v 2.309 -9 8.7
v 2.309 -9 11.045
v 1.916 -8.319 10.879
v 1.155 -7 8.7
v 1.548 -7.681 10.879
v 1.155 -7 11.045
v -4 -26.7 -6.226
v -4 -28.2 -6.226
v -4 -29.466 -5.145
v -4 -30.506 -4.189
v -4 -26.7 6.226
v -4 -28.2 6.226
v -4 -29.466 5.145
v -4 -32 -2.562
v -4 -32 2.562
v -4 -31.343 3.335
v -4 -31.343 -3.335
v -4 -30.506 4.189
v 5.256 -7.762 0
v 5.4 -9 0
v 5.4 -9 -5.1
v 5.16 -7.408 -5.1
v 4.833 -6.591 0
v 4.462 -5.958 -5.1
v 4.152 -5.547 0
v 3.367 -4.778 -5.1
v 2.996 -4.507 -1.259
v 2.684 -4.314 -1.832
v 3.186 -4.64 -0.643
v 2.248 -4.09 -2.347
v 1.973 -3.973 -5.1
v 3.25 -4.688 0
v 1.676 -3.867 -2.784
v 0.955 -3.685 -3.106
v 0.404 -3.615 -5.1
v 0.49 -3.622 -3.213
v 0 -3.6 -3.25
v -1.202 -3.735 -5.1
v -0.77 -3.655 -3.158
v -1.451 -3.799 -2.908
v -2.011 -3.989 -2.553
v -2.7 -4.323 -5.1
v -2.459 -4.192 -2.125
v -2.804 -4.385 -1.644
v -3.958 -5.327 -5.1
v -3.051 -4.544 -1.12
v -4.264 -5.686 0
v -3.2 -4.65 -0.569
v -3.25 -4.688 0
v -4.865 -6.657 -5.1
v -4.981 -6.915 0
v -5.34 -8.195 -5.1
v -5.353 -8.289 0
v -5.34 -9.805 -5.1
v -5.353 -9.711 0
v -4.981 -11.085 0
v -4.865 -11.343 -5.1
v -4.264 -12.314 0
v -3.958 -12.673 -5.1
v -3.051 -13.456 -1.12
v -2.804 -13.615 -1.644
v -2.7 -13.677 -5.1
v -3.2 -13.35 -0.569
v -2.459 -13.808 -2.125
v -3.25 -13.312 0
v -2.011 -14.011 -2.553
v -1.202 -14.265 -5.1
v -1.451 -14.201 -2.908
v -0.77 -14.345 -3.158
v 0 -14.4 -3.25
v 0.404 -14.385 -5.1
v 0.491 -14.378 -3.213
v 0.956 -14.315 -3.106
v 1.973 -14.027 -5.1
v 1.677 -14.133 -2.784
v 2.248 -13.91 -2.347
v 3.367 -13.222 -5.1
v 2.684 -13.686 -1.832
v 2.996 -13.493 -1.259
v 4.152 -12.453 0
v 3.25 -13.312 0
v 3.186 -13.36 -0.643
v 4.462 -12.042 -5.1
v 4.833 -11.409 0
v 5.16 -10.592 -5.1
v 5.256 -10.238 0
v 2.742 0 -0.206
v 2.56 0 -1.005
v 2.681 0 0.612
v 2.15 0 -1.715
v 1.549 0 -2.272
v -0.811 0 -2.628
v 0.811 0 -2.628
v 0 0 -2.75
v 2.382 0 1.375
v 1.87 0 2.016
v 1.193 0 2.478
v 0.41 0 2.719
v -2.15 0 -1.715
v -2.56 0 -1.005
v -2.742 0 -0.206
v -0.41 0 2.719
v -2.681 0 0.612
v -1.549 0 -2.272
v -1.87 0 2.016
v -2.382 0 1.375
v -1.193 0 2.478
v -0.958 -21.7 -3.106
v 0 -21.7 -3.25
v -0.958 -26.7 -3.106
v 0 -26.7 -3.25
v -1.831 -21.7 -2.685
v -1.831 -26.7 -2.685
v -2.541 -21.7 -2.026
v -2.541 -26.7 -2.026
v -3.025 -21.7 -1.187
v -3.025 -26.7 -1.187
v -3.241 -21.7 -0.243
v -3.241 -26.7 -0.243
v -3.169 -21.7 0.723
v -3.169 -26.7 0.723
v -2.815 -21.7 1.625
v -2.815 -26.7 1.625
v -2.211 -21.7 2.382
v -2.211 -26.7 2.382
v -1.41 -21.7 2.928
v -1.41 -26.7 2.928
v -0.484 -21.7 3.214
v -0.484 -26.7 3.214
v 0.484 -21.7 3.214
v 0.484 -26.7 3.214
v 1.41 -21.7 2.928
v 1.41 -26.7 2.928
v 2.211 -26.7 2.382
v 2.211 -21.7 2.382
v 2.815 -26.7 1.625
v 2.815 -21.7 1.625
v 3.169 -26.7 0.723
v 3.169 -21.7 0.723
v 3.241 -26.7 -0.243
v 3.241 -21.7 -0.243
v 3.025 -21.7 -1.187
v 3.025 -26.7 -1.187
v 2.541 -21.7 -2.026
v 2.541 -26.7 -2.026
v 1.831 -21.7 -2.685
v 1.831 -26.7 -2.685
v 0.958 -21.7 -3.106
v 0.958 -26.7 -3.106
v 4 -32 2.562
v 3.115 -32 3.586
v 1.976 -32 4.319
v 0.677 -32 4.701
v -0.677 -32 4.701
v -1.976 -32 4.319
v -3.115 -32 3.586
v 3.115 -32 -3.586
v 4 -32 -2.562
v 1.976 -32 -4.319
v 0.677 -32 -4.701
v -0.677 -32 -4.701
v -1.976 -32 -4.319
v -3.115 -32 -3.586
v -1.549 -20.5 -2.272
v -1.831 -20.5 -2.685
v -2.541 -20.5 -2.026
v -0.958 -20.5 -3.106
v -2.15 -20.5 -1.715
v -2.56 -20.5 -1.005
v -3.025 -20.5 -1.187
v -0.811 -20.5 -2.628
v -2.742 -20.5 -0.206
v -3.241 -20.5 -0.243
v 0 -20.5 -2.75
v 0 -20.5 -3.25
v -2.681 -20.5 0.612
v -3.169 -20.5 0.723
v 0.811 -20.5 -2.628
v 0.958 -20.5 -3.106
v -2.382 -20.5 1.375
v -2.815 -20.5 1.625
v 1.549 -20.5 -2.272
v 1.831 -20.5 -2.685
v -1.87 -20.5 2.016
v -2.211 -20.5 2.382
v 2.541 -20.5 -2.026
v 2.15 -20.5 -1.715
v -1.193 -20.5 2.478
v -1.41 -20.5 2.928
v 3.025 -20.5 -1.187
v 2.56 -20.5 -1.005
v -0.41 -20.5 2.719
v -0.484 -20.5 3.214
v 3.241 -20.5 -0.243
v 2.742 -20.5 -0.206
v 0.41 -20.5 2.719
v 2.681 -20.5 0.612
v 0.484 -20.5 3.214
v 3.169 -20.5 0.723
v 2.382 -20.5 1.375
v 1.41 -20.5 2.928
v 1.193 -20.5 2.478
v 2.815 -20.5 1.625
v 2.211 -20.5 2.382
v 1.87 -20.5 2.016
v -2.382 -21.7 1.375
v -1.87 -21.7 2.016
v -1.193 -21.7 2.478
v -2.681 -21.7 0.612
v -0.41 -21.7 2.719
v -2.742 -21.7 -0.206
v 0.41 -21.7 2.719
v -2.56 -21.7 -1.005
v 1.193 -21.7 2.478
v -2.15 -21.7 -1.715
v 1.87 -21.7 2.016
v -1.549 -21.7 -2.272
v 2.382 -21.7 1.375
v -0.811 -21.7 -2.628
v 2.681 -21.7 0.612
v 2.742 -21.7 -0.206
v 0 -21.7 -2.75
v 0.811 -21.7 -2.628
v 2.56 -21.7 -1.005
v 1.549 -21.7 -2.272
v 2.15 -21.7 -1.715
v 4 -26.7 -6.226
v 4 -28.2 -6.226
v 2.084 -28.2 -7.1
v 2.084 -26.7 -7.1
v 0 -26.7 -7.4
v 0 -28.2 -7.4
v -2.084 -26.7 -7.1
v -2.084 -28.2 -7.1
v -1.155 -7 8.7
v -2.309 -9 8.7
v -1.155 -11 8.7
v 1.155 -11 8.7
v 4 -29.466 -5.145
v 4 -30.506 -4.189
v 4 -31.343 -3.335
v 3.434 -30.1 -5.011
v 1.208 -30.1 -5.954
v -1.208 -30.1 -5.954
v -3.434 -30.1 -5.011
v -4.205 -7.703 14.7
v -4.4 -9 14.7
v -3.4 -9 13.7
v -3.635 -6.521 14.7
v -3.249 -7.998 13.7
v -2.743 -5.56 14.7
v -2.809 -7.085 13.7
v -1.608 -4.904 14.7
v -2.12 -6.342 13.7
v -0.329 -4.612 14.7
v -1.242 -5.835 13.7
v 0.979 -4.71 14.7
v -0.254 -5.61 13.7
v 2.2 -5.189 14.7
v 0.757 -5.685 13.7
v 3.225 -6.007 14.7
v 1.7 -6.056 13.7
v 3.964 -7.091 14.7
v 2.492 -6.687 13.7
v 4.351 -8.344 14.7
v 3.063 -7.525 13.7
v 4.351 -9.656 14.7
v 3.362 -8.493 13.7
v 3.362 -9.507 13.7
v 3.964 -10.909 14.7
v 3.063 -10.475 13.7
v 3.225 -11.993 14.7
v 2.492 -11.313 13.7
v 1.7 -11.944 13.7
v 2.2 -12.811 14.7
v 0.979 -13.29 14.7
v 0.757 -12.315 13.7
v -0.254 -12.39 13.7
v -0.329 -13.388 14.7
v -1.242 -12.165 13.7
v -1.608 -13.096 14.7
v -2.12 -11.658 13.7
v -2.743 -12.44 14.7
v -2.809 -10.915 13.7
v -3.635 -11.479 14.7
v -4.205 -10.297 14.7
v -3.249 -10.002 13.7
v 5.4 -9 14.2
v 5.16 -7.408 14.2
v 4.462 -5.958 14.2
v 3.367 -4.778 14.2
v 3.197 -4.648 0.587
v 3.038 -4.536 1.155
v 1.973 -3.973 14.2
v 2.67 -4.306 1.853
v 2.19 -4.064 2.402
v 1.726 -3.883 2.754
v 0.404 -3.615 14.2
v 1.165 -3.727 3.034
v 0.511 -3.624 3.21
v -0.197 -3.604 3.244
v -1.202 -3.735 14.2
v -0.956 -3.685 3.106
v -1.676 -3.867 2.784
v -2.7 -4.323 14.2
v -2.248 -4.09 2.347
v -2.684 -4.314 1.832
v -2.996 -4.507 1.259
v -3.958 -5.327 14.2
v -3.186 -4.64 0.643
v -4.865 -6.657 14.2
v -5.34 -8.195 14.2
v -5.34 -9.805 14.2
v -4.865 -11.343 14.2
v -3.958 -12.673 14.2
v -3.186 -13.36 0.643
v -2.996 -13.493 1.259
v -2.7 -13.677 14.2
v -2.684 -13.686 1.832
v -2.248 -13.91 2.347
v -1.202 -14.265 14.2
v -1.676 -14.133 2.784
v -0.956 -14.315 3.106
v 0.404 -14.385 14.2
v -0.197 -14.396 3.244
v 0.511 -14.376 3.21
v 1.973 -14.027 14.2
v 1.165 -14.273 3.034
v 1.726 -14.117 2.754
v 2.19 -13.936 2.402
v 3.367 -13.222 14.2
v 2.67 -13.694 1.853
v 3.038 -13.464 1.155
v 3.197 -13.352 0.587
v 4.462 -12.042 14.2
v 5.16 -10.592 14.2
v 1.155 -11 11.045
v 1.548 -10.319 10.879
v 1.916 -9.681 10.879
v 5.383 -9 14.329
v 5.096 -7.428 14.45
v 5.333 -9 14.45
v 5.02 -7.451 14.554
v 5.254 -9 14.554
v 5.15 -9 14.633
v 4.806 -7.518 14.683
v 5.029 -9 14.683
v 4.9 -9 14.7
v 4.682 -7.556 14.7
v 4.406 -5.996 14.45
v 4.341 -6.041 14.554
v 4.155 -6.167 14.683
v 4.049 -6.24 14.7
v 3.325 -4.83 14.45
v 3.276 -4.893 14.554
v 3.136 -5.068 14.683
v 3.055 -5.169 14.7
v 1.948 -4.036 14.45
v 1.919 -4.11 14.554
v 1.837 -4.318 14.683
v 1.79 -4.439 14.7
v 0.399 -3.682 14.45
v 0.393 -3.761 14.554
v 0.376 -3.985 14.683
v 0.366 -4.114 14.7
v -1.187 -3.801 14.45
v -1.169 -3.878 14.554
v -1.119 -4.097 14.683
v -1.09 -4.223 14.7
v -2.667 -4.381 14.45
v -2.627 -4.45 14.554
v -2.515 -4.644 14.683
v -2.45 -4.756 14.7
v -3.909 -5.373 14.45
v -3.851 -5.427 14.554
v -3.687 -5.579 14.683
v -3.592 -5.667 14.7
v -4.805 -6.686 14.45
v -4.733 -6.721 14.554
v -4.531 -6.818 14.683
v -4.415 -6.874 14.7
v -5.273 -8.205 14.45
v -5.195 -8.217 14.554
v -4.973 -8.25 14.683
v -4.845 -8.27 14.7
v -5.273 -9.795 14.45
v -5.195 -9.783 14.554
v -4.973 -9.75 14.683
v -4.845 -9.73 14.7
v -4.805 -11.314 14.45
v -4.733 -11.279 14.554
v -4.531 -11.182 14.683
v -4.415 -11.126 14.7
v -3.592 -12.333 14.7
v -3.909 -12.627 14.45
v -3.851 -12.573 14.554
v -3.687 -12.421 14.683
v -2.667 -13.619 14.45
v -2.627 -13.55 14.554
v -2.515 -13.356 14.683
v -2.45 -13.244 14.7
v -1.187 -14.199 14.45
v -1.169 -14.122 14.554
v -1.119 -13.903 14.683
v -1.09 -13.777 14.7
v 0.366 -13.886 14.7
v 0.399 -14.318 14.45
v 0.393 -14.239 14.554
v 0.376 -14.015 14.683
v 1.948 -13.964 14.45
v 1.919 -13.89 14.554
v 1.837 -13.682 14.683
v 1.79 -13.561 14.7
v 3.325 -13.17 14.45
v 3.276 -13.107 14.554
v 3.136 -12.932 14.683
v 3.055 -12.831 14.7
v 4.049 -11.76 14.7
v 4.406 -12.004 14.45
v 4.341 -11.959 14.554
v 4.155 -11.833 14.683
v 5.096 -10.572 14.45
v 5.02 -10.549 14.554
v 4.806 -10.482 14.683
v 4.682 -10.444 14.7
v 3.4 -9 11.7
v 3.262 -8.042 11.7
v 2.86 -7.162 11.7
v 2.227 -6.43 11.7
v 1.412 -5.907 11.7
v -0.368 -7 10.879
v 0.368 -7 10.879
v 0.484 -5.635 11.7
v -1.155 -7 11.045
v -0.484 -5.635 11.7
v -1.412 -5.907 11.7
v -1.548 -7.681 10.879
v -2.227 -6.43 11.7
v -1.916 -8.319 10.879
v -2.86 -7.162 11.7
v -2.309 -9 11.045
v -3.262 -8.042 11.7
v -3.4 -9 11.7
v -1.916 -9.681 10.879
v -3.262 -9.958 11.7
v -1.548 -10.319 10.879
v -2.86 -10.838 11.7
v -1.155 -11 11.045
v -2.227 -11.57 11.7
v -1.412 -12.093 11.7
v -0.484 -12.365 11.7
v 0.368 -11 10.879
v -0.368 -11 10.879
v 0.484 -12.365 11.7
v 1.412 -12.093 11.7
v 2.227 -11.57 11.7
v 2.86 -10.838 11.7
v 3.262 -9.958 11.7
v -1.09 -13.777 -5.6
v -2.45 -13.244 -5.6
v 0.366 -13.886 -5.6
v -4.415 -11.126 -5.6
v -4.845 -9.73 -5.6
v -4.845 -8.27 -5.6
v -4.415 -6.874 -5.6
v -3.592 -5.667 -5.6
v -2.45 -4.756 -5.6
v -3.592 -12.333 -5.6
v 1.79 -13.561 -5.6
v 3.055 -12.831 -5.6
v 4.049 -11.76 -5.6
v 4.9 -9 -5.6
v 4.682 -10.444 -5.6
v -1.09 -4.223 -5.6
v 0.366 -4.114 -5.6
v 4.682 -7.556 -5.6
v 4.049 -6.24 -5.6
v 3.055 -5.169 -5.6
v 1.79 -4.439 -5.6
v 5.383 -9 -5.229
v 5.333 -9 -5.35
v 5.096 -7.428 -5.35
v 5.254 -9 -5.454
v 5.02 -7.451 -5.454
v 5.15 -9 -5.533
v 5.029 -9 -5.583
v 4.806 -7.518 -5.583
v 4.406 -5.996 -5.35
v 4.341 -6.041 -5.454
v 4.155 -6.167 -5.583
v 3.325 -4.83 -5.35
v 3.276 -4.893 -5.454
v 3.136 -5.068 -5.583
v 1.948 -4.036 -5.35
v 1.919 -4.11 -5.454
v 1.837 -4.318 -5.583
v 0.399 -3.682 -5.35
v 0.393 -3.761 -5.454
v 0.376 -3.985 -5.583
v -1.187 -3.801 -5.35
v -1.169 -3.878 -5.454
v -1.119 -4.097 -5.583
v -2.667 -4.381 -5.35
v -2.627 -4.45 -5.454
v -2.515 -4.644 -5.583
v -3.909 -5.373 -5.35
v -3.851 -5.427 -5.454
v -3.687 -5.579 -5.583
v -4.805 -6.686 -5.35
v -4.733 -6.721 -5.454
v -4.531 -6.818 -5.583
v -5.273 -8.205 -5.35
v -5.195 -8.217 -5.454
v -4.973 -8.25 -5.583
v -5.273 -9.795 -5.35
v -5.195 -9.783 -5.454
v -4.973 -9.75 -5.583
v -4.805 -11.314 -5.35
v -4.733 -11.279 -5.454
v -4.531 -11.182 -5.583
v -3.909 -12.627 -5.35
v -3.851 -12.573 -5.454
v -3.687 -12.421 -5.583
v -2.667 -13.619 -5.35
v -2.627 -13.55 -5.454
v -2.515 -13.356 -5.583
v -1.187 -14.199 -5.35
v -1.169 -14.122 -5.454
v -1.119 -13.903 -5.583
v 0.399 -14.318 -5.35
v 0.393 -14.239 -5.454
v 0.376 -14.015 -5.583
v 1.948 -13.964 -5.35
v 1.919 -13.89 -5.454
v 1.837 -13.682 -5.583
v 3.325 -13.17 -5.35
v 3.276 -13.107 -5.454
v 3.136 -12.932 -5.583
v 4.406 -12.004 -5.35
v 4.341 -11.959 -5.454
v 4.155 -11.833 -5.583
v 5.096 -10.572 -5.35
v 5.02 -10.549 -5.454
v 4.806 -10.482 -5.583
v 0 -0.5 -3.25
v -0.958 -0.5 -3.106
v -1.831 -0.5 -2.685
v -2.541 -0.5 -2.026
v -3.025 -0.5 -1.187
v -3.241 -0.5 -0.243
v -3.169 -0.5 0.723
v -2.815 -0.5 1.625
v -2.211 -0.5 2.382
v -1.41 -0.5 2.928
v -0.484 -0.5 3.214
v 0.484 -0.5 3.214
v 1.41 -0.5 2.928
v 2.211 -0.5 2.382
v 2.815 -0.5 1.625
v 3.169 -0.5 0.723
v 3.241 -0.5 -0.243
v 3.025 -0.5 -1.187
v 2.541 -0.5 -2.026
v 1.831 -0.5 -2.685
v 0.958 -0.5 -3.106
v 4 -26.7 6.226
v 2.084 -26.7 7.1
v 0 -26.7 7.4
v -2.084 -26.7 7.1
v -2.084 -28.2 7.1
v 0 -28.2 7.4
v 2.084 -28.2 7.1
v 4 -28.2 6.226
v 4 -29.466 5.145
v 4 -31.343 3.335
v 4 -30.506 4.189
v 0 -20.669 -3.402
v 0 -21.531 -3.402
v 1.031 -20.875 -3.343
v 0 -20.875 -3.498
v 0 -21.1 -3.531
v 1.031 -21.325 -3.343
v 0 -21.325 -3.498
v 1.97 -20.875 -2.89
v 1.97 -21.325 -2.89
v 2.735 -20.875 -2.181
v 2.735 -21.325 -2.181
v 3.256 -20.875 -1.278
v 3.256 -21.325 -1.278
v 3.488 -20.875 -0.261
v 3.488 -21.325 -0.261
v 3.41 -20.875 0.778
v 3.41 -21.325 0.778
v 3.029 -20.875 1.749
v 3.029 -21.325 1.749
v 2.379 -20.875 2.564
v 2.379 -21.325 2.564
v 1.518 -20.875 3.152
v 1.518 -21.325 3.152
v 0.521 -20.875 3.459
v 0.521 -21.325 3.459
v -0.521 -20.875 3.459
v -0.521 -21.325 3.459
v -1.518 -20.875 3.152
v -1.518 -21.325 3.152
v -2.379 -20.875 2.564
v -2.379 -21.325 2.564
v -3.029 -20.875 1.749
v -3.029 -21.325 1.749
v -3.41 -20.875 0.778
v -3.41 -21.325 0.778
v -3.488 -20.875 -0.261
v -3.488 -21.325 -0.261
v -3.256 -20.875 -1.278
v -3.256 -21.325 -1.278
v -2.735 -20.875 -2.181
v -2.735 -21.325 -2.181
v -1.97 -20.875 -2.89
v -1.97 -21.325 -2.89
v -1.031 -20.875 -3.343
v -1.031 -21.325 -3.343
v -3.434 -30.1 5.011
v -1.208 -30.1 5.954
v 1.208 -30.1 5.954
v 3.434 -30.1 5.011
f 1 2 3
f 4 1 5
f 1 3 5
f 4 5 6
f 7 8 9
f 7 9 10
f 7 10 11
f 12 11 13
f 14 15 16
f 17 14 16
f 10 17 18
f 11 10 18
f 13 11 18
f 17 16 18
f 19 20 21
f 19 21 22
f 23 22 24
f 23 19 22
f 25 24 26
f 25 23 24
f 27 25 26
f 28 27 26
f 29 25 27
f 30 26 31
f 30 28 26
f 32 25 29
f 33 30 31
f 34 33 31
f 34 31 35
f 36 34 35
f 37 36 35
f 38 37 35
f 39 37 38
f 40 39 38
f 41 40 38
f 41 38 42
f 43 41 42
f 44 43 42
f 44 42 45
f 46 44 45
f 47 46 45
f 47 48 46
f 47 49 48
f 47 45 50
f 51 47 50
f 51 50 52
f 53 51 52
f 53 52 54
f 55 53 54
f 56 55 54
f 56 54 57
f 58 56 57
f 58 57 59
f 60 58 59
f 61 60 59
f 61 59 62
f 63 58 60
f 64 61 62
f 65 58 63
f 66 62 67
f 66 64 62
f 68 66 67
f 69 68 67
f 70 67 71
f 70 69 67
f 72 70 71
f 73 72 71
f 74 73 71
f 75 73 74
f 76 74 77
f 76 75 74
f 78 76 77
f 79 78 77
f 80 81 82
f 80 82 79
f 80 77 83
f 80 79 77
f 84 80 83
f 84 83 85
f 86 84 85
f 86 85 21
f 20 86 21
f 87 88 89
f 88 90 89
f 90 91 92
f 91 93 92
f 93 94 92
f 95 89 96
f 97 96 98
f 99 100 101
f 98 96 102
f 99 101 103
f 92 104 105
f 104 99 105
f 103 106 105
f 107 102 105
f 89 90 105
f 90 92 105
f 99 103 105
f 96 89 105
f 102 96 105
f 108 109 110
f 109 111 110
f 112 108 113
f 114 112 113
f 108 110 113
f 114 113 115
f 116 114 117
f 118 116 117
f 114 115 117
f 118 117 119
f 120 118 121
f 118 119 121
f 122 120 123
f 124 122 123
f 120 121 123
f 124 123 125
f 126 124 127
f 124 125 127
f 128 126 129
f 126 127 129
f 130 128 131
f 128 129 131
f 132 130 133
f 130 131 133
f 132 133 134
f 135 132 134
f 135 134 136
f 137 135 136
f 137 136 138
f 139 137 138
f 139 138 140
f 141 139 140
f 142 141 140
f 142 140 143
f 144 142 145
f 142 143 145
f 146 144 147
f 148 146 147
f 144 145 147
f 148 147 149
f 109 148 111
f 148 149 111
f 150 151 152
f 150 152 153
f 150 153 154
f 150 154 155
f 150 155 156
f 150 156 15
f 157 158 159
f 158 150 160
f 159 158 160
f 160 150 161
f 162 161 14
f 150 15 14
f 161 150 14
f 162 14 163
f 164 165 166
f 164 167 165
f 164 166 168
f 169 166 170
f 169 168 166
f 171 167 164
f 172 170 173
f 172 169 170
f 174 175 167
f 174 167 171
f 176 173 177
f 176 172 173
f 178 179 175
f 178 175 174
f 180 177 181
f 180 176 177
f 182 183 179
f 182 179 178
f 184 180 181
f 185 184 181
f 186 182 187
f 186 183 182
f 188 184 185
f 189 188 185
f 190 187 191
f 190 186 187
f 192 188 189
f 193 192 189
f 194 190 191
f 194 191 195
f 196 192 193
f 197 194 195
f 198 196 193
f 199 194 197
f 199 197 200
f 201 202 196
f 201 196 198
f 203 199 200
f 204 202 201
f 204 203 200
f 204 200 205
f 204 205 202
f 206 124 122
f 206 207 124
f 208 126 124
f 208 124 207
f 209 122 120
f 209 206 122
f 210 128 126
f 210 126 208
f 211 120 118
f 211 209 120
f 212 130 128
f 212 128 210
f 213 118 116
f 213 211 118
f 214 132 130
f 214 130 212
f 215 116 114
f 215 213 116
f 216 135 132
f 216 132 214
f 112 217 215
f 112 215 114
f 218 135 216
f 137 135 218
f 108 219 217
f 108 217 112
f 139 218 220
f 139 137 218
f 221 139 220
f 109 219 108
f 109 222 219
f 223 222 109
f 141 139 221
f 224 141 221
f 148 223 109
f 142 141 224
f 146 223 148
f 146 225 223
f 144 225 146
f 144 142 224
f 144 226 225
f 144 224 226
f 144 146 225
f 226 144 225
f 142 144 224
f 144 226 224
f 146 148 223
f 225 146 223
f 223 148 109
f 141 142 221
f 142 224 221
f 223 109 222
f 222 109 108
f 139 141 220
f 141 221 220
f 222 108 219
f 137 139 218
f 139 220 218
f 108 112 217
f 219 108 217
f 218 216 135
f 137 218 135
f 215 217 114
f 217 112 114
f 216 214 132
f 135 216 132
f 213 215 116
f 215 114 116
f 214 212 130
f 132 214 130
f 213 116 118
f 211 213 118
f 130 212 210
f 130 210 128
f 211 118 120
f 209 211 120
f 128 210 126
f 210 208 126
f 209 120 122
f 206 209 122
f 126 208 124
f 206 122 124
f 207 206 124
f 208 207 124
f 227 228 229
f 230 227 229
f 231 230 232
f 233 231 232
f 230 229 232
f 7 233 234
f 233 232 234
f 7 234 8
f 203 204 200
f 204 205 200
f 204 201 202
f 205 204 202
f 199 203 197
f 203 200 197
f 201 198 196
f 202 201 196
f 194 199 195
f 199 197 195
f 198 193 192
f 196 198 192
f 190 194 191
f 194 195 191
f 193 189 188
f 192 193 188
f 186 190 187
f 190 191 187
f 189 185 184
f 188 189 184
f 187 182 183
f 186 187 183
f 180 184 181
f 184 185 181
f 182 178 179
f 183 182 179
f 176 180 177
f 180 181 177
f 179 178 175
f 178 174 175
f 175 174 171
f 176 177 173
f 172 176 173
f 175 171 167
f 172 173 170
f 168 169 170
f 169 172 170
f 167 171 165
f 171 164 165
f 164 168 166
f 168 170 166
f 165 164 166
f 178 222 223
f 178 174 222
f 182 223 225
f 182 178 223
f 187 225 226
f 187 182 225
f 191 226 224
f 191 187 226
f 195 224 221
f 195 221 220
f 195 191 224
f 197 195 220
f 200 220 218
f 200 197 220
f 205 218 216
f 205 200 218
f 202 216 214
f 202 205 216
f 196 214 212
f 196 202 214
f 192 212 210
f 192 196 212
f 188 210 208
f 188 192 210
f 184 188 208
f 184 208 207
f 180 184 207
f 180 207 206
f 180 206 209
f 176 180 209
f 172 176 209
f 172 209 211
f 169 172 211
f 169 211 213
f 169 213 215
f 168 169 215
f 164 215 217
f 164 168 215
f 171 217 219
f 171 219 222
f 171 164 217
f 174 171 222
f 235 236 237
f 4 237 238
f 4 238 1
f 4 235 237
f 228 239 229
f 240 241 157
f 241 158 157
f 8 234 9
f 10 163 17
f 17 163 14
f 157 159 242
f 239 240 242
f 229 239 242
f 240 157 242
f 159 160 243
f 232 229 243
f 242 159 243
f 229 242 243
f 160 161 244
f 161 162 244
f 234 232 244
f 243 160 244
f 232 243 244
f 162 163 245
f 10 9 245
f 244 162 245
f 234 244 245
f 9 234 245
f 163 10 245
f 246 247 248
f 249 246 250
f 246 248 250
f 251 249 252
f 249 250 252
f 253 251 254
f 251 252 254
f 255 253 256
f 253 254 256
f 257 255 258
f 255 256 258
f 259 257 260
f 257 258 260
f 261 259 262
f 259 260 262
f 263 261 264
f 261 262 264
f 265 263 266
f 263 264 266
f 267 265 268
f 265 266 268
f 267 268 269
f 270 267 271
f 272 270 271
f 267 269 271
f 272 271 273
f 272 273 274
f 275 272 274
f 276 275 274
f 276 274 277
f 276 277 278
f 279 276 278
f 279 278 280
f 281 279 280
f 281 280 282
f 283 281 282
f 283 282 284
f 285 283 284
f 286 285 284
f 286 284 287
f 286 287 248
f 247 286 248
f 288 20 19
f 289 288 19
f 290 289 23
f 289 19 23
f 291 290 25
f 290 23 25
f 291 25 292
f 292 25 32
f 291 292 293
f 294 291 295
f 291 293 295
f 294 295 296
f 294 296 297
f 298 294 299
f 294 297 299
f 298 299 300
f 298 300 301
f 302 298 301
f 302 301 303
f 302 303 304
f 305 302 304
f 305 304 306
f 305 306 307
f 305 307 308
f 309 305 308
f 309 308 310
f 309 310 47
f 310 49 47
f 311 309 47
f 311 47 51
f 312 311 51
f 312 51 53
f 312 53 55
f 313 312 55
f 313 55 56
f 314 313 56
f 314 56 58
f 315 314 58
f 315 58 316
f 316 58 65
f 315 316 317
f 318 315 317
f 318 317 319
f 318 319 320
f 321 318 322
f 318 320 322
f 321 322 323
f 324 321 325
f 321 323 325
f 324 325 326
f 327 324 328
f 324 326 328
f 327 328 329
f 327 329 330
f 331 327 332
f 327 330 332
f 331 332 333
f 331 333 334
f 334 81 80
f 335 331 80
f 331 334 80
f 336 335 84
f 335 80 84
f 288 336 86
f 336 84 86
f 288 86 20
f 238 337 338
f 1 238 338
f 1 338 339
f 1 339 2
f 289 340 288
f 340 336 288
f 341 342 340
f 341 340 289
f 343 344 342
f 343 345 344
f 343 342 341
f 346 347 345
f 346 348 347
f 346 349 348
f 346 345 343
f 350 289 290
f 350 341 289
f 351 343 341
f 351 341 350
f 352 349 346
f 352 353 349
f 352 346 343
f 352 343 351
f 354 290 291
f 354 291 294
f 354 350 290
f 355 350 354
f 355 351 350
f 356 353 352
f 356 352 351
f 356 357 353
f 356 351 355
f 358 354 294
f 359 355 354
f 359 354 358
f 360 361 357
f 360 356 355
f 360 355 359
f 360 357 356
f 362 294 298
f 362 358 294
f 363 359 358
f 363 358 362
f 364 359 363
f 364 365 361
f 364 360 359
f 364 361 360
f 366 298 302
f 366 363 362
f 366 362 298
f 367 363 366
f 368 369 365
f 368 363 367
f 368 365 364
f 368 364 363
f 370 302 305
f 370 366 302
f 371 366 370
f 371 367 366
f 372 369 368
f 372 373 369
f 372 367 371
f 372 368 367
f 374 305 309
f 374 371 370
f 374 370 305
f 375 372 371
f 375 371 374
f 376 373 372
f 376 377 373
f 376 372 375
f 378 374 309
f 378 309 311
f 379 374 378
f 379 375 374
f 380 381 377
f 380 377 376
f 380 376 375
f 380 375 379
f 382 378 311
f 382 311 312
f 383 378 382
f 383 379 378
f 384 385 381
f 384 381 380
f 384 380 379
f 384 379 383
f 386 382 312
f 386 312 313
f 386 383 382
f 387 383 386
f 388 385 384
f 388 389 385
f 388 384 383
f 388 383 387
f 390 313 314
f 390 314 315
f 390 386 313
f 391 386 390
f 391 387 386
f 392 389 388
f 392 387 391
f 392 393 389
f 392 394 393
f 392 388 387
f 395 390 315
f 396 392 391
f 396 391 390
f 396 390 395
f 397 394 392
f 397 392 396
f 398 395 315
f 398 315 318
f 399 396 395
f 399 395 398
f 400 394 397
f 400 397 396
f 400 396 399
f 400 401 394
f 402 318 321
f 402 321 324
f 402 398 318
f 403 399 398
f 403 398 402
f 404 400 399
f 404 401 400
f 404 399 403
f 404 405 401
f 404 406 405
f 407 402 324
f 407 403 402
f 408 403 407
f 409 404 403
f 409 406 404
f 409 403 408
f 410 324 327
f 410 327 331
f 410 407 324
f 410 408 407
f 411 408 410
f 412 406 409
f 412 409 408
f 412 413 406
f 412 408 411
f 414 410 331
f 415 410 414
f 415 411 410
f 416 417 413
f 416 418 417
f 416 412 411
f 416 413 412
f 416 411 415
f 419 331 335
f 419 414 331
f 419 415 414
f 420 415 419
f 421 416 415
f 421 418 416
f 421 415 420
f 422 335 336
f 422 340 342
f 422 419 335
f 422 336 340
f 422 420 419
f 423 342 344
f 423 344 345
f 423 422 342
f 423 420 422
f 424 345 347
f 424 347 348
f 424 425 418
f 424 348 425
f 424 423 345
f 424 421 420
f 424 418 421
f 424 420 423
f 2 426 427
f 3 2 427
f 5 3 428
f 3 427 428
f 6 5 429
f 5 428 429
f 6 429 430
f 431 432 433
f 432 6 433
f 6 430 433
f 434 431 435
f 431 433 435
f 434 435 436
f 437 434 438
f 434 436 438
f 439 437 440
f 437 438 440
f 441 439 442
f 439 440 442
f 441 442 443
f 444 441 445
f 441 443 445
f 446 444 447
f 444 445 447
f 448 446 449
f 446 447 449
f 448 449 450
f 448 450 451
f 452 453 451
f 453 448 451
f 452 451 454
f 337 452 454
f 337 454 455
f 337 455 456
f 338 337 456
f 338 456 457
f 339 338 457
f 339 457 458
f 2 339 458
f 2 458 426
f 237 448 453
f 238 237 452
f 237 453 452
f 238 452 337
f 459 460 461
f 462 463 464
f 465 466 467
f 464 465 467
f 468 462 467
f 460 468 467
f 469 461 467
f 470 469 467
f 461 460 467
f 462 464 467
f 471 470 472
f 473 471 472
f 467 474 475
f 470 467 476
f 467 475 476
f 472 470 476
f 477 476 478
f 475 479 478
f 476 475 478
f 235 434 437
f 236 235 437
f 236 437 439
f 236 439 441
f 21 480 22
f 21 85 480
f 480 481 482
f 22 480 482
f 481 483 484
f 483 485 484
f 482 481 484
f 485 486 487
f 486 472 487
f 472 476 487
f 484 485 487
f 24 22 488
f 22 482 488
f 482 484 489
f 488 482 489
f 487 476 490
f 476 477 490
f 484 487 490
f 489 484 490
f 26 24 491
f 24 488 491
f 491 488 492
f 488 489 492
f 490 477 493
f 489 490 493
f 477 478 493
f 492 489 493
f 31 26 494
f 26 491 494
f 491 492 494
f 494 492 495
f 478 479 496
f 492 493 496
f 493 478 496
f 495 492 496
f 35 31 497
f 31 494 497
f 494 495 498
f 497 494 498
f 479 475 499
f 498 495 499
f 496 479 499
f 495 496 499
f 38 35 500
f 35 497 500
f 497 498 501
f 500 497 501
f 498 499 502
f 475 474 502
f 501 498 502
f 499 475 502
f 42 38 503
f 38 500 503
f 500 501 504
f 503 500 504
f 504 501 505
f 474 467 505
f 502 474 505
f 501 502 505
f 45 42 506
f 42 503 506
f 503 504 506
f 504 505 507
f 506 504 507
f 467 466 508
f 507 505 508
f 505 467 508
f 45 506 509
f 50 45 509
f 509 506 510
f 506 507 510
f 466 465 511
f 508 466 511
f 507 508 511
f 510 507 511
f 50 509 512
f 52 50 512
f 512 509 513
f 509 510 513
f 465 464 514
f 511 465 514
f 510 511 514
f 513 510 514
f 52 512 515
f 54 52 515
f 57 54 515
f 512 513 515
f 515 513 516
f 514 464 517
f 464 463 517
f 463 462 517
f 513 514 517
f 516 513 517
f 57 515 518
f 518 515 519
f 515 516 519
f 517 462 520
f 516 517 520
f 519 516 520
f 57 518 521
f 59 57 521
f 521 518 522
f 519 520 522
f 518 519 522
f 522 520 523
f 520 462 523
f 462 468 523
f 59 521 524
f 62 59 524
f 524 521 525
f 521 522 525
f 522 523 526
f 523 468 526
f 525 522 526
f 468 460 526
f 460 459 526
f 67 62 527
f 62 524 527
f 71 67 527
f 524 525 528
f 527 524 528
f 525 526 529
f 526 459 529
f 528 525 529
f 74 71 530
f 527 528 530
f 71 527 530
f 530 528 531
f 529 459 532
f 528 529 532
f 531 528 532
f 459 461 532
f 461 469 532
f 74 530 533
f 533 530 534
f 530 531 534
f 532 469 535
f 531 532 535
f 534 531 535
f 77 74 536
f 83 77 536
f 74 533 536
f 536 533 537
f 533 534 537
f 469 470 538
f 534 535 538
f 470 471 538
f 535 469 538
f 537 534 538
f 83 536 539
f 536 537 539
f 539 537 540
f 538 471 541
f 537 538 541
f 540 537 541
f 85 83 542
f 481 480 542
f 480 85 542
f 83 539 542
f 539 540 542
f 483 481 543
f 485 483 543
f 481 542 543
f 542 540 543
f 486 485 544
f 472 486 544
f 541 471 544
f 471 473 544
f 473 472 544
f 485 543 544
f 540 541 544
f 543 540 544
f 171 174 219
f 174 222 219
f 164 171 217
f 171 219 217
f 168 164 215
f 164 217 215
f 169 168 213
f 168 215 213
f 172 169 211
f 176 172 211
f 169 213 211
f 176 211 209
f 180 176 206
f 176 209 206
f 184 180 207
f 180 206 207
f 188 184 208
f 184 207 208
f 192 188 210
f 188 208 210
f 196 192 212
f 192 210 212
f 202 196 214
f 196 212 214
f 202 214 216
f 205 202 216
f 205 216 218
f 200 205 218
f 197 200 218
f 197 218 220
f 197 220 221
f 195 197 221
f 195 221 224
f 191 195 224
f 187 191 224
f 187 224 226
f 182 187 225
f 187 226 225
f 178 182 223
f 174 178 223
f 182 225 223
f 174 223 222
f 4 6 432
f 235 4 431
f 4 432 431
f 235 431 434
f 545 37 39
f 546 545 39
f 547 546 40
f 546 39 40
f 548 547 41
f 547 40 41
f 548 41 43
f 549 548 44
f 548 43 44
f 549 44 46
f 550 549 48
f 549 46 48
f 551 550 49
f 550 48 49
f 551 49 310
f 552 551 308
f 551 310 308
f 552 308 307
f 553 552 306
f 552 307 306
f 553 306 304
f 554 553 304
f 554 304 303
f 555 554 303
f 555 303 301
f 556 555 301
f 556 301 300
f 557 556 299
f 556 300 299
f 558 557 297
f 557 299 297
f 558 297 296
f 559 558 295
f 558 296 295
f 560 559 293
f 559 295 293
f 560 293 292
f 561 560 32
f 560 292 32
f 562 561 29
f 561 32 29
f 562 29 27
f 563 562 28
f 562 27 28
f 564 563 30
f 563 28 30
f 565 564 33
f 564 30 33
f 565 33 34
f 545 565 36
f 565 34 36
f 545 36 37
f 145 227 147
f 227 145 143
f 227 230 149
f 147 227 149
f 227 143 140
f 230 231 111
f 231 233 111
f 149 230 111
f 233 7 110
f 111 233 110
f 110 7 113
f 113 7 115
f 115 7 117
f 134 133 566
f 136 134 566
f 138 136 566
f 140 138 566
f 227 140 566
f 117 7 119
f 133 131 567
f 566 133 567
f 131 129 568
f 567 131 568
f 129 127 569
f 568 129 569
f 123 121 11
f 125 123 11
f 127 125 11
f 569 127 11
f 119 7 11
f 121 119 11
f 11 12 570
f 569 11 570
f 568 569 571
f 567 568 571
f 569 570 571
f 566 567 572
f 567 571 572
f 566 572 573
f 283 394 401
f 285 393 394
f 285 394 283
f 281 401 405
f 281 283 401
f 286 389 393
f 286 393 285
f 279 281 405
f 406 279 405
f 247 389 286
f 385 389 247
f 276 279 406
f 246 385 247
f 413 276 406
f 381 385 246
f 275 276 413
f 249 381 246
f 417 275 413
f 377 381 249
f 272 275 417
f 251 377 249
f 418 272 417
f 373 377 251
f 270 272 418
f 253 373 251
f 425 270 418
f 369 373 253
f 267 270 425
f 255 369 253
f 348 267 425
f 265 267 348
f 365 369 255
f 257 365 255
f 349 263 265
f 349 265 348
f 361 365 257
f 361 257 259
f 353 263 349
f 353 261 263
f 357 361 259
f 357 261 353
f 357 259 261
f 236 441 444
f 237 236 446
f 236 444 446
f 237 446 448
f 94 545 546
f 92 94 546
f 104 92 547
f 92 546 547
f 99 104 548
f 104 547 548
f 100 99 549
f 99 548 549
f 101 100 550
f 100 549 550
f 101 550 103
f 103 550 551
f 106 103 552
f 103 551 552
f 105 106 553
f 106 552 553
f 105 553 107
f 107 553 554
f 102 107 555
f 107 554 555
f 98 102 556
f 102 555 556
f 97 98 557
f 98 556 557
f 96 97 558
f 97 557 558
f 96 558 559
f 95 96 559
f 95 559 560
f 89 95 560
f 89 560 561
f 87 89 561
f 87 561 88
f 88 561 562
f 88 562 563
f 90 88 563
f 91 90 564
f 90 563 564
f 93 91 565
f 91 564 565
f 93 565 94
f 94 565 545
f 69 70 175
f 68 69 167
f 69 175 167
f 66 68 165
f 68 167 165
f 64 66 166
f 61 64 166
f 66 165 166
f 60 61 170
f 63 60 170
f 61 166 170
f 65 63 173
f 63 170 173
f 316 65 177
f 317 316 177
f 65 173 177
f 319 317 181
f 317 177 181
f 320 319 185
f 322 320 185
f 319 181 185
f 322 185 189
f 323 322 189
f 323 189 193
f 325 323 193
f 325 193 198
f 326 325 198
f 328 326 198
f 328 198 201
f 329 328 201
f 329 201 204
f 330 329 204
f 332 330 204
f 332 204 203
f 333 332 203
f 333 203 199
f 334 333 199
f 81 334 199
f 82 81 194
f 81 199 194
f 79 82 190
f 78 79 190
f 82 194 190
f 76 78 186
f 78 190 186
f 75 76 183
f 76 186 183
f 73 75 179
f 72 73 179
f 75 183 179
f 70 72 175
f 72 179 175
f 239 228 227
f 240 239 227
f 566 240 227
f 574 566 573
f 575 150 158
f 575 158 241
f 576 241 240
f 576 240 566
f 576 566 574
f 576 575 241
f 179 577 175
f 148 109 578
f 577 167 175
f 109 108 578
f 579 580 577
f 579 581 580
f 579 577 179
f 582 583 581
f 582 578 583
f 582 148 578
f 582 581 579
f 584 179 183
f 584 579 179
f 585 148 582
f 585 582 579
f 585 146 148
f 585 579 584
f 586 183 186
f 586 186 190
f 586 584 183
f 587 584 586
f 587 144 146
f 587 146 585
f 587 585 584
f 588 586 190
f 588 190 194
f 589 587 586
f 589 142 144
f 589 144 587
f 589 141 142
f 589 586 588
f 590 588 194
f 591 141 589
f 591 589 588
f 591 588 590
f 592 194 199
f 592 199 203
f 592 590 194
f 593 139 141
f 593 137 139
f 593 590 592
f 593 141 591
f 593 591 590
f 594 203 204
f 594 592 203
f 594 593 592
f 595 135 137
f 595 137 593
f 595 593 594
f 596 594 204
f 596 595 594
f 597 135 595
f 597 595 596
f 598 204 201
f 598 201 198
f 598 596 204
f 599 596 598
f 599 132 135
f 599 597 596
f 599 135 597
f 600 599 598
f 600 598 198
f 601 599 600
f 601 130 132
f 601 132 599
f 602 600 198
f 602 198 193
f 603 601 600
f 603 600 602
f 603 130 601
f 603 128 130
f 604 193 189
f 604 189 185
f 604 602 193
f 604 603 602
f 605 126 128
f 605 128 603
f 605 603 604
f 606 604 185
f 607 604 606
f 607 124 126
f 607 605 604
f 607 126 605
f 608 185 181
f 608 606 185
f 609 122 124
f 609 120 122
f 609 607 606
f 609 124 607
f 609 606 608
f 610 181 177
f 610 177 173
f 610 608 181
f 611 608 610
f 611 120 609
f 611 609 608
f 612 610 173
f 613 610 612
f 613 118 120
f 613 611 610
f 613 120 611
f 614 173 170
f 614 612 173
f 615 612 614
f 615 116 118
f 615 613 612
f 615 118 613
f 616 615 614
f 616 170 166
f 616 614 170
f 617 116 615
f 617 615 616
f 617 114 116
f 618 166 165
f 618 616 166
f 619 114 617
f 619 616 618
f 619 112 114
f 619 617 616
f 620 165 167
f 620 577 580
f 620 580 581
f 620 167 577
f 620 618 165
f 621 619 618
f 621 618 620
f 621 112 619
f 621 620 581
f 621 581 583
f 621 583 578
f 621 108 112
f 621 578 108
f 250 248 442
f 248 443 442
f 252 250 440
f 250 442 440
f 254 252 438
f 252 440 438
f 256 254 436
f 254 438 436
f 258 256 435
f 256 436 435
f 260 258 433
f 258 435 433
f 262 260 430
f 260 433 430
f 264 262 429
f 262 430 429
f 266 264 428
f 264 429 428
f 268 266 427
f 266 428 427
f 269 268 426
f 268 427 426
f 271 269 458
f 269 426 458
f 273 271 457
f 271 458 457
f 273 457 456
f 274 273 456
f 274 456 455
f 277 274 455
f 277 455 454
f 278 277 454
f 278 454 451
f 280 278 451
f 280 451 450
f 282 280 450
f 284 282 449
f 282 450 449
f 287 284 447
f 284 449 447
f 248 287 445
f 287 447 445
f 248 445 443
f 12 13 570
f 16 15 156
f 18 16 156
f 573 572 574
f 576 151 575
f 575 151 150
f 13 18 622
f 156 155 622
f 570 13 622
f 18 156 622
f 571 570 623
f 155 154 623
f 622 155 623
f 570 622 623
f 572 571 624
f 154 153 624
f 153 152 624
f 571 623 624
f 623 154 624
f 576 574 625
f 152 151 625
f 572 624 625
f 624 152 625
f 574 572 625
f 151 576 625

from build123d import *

# Parameters (mm, degrees)
SKETCH_6_OUTSIDE_W          = 24.448
SKETCH_6_OUTSIDE_H          = 24.448
SKETCH_6_OUTSIDE_W_2        = 8
SKETCH_6_OUTSIDE_H_2        = 14.8
CUT_EXTRUDE_1_DEPTH         = 5.3
CHAMFER_1_SIZE              = 0.5
SKETCH_12_R                 = 5.4
EXTRUDE_2_DEPTH             = 14.7
EXTRUDE_2_DEPTH_BACK        = 5.6
HOLE_WIZARD_M81_D           = 6.8
HOLE_WIZARD_M81_DEPTH       = 3
HOLE_WIZARD_M81_CSINK_D     = 8.8
HOLE_WIZARD_M81_CSINK_ANGLE = 90
HOLE_WIZARD_M81_TIP         = 2.042926105
FILLET_1_R                  = 0.5
CUT_EXTRUDE_2_DEPTH         = 6


with BuildPart() as part:
    # Эскиз3 → Повернуть1 (revolve)
    with BuildSketch(Plane.XY, mode=Mode.PRIVATE) as revolve_1_sk:
        Polygon((0, 0), (-3.25, 0), (-3.25, -20.5), (-2.75, -20.5), (-2.75, -21.7), (-3.25, -21.7), (-3.25, -26.7), (-7.4, -26.7), (-7.4, -28.2), (-4.75, -32), (0, -32), align=None)
    revolve(revolve_1_sk.sketch.rotate(Axis((0, 0, 0), (0, 1, 0)), 270), axis=Axis((0, 0, 0), (0, 1, 0)))  # turned: the seam where the file's is

    # Эскиз6 outside → Вырез-Вытянуть1 (cut)
    with BuildSketch(Plane.XZ.offset(32)):
        Rectangle(SKETCH_6_OUTSIDE_W, SKETCH_6_OUTSIDE_H)
        Rectangle(SKETCH_6_OUTSIDE_W_2, SKETCH_6_OUTSIDE_H_2, mode=Mode.SUBTRACT)
    extrude(amount=-CUT_EXTRUDE_1_DEPTH, mode=Mode.SUBTRACT)

    # Фаска1
    chamfer_1_edges = [part.edges().sort_by_distance(p)[0] for p in [
        (0, 0, 3.25),
    ]]
    chamfer(chamfer_1_edges, length=CHAMFER_1_SIZE)

    # Эскиз12 → Бобышка-Вытянуть2 (add, two sides)
    with BuildSketch(Plane.XY) as extrude_2_sk:
        with Locations((0, -9)):
            Circle(SKETCH_12_R)
    extrude(amount=EXTRUDE_2_DEPTH)
    extrude(extrude_2_sk.sketch, amount=-EXTRUDE_2_DEPTH_BACK)

    # Отверстие обработанное метчиком M81
    with Locations(Plane.XY.offset(14.7)):
        with Locations((0, -9)):
            CounterSinkHole(HOLE_WIZARD_M81_D / 2, HOLE_WIZARD_M81_CSINK_D / 2, depth=HOLE_WIZARD_M81_DEPTH, counter_sink_angle=HOLE_WIZARD_M81_CSINK_ANGLE)
            with Locations((0, 0, -(HOLE_WIZARD_M81_DEPTH + HOLE_WIZARD_M81_TIP / 2))):  # 118° drill point
                Cone(0, HOLE_WIZARD_M81_D / 2, HOLE_WIZARD_M81_TIP, mode=Mode.SUBTRACT)

    # Скругление1
    fillet_1_edges = [part.edges().sort_by_distance(p)[0] for p in [
        (-5.4, -9, -5.6),
        (-5.4, -9, 14.7),
    ]]
    fillet(fillet_1_edges, radius=FILLET_1_R)

    # Эскиз15 → Вырез-Вытянуть2 (cut)
    with BuildSketch(Plane.XY.offset(14.7)):
        Polygon((2.309401077, -9), (1.154700538, -7), (-1.154700538, -7), (-2.309401077, -9), (-1.154700538, -11), (1.154700538, -11), align=None)
    extrude(amount=-CUT_EXTRUDE_2_DEPTH, mode=Mode.SUBTRACT)


with BuildPart() as body_2:
    # Эскиз16 → Повернуть2 (revolve)
    with BuildSketch(Plane.XY, mode=Mode.PRIVATE) as revolve_2_sk:
        with BuildLine():
            Line((-2.75, -20.5), (-3.25, -20.5))
            ThreePointArc((-3.25, -20.5), (-3.531024968, -21.1), (-3.25, -21.7))
            Line((-3.25, -21.7), (-2.75, -21.7))
            Line((-2.75, -21.7), (-2.75, -20.5))
        make_face()
    revolve(revolve_2_sk.sketch.rotate(Axis((0, -20.5, 0), (0, -1, 0)), 90), axis=Axis((0, -20.5, 0), (0, -1, 0)))  # turned: the seam where the file's is


solid = Compound([part.part, body_2.part])
